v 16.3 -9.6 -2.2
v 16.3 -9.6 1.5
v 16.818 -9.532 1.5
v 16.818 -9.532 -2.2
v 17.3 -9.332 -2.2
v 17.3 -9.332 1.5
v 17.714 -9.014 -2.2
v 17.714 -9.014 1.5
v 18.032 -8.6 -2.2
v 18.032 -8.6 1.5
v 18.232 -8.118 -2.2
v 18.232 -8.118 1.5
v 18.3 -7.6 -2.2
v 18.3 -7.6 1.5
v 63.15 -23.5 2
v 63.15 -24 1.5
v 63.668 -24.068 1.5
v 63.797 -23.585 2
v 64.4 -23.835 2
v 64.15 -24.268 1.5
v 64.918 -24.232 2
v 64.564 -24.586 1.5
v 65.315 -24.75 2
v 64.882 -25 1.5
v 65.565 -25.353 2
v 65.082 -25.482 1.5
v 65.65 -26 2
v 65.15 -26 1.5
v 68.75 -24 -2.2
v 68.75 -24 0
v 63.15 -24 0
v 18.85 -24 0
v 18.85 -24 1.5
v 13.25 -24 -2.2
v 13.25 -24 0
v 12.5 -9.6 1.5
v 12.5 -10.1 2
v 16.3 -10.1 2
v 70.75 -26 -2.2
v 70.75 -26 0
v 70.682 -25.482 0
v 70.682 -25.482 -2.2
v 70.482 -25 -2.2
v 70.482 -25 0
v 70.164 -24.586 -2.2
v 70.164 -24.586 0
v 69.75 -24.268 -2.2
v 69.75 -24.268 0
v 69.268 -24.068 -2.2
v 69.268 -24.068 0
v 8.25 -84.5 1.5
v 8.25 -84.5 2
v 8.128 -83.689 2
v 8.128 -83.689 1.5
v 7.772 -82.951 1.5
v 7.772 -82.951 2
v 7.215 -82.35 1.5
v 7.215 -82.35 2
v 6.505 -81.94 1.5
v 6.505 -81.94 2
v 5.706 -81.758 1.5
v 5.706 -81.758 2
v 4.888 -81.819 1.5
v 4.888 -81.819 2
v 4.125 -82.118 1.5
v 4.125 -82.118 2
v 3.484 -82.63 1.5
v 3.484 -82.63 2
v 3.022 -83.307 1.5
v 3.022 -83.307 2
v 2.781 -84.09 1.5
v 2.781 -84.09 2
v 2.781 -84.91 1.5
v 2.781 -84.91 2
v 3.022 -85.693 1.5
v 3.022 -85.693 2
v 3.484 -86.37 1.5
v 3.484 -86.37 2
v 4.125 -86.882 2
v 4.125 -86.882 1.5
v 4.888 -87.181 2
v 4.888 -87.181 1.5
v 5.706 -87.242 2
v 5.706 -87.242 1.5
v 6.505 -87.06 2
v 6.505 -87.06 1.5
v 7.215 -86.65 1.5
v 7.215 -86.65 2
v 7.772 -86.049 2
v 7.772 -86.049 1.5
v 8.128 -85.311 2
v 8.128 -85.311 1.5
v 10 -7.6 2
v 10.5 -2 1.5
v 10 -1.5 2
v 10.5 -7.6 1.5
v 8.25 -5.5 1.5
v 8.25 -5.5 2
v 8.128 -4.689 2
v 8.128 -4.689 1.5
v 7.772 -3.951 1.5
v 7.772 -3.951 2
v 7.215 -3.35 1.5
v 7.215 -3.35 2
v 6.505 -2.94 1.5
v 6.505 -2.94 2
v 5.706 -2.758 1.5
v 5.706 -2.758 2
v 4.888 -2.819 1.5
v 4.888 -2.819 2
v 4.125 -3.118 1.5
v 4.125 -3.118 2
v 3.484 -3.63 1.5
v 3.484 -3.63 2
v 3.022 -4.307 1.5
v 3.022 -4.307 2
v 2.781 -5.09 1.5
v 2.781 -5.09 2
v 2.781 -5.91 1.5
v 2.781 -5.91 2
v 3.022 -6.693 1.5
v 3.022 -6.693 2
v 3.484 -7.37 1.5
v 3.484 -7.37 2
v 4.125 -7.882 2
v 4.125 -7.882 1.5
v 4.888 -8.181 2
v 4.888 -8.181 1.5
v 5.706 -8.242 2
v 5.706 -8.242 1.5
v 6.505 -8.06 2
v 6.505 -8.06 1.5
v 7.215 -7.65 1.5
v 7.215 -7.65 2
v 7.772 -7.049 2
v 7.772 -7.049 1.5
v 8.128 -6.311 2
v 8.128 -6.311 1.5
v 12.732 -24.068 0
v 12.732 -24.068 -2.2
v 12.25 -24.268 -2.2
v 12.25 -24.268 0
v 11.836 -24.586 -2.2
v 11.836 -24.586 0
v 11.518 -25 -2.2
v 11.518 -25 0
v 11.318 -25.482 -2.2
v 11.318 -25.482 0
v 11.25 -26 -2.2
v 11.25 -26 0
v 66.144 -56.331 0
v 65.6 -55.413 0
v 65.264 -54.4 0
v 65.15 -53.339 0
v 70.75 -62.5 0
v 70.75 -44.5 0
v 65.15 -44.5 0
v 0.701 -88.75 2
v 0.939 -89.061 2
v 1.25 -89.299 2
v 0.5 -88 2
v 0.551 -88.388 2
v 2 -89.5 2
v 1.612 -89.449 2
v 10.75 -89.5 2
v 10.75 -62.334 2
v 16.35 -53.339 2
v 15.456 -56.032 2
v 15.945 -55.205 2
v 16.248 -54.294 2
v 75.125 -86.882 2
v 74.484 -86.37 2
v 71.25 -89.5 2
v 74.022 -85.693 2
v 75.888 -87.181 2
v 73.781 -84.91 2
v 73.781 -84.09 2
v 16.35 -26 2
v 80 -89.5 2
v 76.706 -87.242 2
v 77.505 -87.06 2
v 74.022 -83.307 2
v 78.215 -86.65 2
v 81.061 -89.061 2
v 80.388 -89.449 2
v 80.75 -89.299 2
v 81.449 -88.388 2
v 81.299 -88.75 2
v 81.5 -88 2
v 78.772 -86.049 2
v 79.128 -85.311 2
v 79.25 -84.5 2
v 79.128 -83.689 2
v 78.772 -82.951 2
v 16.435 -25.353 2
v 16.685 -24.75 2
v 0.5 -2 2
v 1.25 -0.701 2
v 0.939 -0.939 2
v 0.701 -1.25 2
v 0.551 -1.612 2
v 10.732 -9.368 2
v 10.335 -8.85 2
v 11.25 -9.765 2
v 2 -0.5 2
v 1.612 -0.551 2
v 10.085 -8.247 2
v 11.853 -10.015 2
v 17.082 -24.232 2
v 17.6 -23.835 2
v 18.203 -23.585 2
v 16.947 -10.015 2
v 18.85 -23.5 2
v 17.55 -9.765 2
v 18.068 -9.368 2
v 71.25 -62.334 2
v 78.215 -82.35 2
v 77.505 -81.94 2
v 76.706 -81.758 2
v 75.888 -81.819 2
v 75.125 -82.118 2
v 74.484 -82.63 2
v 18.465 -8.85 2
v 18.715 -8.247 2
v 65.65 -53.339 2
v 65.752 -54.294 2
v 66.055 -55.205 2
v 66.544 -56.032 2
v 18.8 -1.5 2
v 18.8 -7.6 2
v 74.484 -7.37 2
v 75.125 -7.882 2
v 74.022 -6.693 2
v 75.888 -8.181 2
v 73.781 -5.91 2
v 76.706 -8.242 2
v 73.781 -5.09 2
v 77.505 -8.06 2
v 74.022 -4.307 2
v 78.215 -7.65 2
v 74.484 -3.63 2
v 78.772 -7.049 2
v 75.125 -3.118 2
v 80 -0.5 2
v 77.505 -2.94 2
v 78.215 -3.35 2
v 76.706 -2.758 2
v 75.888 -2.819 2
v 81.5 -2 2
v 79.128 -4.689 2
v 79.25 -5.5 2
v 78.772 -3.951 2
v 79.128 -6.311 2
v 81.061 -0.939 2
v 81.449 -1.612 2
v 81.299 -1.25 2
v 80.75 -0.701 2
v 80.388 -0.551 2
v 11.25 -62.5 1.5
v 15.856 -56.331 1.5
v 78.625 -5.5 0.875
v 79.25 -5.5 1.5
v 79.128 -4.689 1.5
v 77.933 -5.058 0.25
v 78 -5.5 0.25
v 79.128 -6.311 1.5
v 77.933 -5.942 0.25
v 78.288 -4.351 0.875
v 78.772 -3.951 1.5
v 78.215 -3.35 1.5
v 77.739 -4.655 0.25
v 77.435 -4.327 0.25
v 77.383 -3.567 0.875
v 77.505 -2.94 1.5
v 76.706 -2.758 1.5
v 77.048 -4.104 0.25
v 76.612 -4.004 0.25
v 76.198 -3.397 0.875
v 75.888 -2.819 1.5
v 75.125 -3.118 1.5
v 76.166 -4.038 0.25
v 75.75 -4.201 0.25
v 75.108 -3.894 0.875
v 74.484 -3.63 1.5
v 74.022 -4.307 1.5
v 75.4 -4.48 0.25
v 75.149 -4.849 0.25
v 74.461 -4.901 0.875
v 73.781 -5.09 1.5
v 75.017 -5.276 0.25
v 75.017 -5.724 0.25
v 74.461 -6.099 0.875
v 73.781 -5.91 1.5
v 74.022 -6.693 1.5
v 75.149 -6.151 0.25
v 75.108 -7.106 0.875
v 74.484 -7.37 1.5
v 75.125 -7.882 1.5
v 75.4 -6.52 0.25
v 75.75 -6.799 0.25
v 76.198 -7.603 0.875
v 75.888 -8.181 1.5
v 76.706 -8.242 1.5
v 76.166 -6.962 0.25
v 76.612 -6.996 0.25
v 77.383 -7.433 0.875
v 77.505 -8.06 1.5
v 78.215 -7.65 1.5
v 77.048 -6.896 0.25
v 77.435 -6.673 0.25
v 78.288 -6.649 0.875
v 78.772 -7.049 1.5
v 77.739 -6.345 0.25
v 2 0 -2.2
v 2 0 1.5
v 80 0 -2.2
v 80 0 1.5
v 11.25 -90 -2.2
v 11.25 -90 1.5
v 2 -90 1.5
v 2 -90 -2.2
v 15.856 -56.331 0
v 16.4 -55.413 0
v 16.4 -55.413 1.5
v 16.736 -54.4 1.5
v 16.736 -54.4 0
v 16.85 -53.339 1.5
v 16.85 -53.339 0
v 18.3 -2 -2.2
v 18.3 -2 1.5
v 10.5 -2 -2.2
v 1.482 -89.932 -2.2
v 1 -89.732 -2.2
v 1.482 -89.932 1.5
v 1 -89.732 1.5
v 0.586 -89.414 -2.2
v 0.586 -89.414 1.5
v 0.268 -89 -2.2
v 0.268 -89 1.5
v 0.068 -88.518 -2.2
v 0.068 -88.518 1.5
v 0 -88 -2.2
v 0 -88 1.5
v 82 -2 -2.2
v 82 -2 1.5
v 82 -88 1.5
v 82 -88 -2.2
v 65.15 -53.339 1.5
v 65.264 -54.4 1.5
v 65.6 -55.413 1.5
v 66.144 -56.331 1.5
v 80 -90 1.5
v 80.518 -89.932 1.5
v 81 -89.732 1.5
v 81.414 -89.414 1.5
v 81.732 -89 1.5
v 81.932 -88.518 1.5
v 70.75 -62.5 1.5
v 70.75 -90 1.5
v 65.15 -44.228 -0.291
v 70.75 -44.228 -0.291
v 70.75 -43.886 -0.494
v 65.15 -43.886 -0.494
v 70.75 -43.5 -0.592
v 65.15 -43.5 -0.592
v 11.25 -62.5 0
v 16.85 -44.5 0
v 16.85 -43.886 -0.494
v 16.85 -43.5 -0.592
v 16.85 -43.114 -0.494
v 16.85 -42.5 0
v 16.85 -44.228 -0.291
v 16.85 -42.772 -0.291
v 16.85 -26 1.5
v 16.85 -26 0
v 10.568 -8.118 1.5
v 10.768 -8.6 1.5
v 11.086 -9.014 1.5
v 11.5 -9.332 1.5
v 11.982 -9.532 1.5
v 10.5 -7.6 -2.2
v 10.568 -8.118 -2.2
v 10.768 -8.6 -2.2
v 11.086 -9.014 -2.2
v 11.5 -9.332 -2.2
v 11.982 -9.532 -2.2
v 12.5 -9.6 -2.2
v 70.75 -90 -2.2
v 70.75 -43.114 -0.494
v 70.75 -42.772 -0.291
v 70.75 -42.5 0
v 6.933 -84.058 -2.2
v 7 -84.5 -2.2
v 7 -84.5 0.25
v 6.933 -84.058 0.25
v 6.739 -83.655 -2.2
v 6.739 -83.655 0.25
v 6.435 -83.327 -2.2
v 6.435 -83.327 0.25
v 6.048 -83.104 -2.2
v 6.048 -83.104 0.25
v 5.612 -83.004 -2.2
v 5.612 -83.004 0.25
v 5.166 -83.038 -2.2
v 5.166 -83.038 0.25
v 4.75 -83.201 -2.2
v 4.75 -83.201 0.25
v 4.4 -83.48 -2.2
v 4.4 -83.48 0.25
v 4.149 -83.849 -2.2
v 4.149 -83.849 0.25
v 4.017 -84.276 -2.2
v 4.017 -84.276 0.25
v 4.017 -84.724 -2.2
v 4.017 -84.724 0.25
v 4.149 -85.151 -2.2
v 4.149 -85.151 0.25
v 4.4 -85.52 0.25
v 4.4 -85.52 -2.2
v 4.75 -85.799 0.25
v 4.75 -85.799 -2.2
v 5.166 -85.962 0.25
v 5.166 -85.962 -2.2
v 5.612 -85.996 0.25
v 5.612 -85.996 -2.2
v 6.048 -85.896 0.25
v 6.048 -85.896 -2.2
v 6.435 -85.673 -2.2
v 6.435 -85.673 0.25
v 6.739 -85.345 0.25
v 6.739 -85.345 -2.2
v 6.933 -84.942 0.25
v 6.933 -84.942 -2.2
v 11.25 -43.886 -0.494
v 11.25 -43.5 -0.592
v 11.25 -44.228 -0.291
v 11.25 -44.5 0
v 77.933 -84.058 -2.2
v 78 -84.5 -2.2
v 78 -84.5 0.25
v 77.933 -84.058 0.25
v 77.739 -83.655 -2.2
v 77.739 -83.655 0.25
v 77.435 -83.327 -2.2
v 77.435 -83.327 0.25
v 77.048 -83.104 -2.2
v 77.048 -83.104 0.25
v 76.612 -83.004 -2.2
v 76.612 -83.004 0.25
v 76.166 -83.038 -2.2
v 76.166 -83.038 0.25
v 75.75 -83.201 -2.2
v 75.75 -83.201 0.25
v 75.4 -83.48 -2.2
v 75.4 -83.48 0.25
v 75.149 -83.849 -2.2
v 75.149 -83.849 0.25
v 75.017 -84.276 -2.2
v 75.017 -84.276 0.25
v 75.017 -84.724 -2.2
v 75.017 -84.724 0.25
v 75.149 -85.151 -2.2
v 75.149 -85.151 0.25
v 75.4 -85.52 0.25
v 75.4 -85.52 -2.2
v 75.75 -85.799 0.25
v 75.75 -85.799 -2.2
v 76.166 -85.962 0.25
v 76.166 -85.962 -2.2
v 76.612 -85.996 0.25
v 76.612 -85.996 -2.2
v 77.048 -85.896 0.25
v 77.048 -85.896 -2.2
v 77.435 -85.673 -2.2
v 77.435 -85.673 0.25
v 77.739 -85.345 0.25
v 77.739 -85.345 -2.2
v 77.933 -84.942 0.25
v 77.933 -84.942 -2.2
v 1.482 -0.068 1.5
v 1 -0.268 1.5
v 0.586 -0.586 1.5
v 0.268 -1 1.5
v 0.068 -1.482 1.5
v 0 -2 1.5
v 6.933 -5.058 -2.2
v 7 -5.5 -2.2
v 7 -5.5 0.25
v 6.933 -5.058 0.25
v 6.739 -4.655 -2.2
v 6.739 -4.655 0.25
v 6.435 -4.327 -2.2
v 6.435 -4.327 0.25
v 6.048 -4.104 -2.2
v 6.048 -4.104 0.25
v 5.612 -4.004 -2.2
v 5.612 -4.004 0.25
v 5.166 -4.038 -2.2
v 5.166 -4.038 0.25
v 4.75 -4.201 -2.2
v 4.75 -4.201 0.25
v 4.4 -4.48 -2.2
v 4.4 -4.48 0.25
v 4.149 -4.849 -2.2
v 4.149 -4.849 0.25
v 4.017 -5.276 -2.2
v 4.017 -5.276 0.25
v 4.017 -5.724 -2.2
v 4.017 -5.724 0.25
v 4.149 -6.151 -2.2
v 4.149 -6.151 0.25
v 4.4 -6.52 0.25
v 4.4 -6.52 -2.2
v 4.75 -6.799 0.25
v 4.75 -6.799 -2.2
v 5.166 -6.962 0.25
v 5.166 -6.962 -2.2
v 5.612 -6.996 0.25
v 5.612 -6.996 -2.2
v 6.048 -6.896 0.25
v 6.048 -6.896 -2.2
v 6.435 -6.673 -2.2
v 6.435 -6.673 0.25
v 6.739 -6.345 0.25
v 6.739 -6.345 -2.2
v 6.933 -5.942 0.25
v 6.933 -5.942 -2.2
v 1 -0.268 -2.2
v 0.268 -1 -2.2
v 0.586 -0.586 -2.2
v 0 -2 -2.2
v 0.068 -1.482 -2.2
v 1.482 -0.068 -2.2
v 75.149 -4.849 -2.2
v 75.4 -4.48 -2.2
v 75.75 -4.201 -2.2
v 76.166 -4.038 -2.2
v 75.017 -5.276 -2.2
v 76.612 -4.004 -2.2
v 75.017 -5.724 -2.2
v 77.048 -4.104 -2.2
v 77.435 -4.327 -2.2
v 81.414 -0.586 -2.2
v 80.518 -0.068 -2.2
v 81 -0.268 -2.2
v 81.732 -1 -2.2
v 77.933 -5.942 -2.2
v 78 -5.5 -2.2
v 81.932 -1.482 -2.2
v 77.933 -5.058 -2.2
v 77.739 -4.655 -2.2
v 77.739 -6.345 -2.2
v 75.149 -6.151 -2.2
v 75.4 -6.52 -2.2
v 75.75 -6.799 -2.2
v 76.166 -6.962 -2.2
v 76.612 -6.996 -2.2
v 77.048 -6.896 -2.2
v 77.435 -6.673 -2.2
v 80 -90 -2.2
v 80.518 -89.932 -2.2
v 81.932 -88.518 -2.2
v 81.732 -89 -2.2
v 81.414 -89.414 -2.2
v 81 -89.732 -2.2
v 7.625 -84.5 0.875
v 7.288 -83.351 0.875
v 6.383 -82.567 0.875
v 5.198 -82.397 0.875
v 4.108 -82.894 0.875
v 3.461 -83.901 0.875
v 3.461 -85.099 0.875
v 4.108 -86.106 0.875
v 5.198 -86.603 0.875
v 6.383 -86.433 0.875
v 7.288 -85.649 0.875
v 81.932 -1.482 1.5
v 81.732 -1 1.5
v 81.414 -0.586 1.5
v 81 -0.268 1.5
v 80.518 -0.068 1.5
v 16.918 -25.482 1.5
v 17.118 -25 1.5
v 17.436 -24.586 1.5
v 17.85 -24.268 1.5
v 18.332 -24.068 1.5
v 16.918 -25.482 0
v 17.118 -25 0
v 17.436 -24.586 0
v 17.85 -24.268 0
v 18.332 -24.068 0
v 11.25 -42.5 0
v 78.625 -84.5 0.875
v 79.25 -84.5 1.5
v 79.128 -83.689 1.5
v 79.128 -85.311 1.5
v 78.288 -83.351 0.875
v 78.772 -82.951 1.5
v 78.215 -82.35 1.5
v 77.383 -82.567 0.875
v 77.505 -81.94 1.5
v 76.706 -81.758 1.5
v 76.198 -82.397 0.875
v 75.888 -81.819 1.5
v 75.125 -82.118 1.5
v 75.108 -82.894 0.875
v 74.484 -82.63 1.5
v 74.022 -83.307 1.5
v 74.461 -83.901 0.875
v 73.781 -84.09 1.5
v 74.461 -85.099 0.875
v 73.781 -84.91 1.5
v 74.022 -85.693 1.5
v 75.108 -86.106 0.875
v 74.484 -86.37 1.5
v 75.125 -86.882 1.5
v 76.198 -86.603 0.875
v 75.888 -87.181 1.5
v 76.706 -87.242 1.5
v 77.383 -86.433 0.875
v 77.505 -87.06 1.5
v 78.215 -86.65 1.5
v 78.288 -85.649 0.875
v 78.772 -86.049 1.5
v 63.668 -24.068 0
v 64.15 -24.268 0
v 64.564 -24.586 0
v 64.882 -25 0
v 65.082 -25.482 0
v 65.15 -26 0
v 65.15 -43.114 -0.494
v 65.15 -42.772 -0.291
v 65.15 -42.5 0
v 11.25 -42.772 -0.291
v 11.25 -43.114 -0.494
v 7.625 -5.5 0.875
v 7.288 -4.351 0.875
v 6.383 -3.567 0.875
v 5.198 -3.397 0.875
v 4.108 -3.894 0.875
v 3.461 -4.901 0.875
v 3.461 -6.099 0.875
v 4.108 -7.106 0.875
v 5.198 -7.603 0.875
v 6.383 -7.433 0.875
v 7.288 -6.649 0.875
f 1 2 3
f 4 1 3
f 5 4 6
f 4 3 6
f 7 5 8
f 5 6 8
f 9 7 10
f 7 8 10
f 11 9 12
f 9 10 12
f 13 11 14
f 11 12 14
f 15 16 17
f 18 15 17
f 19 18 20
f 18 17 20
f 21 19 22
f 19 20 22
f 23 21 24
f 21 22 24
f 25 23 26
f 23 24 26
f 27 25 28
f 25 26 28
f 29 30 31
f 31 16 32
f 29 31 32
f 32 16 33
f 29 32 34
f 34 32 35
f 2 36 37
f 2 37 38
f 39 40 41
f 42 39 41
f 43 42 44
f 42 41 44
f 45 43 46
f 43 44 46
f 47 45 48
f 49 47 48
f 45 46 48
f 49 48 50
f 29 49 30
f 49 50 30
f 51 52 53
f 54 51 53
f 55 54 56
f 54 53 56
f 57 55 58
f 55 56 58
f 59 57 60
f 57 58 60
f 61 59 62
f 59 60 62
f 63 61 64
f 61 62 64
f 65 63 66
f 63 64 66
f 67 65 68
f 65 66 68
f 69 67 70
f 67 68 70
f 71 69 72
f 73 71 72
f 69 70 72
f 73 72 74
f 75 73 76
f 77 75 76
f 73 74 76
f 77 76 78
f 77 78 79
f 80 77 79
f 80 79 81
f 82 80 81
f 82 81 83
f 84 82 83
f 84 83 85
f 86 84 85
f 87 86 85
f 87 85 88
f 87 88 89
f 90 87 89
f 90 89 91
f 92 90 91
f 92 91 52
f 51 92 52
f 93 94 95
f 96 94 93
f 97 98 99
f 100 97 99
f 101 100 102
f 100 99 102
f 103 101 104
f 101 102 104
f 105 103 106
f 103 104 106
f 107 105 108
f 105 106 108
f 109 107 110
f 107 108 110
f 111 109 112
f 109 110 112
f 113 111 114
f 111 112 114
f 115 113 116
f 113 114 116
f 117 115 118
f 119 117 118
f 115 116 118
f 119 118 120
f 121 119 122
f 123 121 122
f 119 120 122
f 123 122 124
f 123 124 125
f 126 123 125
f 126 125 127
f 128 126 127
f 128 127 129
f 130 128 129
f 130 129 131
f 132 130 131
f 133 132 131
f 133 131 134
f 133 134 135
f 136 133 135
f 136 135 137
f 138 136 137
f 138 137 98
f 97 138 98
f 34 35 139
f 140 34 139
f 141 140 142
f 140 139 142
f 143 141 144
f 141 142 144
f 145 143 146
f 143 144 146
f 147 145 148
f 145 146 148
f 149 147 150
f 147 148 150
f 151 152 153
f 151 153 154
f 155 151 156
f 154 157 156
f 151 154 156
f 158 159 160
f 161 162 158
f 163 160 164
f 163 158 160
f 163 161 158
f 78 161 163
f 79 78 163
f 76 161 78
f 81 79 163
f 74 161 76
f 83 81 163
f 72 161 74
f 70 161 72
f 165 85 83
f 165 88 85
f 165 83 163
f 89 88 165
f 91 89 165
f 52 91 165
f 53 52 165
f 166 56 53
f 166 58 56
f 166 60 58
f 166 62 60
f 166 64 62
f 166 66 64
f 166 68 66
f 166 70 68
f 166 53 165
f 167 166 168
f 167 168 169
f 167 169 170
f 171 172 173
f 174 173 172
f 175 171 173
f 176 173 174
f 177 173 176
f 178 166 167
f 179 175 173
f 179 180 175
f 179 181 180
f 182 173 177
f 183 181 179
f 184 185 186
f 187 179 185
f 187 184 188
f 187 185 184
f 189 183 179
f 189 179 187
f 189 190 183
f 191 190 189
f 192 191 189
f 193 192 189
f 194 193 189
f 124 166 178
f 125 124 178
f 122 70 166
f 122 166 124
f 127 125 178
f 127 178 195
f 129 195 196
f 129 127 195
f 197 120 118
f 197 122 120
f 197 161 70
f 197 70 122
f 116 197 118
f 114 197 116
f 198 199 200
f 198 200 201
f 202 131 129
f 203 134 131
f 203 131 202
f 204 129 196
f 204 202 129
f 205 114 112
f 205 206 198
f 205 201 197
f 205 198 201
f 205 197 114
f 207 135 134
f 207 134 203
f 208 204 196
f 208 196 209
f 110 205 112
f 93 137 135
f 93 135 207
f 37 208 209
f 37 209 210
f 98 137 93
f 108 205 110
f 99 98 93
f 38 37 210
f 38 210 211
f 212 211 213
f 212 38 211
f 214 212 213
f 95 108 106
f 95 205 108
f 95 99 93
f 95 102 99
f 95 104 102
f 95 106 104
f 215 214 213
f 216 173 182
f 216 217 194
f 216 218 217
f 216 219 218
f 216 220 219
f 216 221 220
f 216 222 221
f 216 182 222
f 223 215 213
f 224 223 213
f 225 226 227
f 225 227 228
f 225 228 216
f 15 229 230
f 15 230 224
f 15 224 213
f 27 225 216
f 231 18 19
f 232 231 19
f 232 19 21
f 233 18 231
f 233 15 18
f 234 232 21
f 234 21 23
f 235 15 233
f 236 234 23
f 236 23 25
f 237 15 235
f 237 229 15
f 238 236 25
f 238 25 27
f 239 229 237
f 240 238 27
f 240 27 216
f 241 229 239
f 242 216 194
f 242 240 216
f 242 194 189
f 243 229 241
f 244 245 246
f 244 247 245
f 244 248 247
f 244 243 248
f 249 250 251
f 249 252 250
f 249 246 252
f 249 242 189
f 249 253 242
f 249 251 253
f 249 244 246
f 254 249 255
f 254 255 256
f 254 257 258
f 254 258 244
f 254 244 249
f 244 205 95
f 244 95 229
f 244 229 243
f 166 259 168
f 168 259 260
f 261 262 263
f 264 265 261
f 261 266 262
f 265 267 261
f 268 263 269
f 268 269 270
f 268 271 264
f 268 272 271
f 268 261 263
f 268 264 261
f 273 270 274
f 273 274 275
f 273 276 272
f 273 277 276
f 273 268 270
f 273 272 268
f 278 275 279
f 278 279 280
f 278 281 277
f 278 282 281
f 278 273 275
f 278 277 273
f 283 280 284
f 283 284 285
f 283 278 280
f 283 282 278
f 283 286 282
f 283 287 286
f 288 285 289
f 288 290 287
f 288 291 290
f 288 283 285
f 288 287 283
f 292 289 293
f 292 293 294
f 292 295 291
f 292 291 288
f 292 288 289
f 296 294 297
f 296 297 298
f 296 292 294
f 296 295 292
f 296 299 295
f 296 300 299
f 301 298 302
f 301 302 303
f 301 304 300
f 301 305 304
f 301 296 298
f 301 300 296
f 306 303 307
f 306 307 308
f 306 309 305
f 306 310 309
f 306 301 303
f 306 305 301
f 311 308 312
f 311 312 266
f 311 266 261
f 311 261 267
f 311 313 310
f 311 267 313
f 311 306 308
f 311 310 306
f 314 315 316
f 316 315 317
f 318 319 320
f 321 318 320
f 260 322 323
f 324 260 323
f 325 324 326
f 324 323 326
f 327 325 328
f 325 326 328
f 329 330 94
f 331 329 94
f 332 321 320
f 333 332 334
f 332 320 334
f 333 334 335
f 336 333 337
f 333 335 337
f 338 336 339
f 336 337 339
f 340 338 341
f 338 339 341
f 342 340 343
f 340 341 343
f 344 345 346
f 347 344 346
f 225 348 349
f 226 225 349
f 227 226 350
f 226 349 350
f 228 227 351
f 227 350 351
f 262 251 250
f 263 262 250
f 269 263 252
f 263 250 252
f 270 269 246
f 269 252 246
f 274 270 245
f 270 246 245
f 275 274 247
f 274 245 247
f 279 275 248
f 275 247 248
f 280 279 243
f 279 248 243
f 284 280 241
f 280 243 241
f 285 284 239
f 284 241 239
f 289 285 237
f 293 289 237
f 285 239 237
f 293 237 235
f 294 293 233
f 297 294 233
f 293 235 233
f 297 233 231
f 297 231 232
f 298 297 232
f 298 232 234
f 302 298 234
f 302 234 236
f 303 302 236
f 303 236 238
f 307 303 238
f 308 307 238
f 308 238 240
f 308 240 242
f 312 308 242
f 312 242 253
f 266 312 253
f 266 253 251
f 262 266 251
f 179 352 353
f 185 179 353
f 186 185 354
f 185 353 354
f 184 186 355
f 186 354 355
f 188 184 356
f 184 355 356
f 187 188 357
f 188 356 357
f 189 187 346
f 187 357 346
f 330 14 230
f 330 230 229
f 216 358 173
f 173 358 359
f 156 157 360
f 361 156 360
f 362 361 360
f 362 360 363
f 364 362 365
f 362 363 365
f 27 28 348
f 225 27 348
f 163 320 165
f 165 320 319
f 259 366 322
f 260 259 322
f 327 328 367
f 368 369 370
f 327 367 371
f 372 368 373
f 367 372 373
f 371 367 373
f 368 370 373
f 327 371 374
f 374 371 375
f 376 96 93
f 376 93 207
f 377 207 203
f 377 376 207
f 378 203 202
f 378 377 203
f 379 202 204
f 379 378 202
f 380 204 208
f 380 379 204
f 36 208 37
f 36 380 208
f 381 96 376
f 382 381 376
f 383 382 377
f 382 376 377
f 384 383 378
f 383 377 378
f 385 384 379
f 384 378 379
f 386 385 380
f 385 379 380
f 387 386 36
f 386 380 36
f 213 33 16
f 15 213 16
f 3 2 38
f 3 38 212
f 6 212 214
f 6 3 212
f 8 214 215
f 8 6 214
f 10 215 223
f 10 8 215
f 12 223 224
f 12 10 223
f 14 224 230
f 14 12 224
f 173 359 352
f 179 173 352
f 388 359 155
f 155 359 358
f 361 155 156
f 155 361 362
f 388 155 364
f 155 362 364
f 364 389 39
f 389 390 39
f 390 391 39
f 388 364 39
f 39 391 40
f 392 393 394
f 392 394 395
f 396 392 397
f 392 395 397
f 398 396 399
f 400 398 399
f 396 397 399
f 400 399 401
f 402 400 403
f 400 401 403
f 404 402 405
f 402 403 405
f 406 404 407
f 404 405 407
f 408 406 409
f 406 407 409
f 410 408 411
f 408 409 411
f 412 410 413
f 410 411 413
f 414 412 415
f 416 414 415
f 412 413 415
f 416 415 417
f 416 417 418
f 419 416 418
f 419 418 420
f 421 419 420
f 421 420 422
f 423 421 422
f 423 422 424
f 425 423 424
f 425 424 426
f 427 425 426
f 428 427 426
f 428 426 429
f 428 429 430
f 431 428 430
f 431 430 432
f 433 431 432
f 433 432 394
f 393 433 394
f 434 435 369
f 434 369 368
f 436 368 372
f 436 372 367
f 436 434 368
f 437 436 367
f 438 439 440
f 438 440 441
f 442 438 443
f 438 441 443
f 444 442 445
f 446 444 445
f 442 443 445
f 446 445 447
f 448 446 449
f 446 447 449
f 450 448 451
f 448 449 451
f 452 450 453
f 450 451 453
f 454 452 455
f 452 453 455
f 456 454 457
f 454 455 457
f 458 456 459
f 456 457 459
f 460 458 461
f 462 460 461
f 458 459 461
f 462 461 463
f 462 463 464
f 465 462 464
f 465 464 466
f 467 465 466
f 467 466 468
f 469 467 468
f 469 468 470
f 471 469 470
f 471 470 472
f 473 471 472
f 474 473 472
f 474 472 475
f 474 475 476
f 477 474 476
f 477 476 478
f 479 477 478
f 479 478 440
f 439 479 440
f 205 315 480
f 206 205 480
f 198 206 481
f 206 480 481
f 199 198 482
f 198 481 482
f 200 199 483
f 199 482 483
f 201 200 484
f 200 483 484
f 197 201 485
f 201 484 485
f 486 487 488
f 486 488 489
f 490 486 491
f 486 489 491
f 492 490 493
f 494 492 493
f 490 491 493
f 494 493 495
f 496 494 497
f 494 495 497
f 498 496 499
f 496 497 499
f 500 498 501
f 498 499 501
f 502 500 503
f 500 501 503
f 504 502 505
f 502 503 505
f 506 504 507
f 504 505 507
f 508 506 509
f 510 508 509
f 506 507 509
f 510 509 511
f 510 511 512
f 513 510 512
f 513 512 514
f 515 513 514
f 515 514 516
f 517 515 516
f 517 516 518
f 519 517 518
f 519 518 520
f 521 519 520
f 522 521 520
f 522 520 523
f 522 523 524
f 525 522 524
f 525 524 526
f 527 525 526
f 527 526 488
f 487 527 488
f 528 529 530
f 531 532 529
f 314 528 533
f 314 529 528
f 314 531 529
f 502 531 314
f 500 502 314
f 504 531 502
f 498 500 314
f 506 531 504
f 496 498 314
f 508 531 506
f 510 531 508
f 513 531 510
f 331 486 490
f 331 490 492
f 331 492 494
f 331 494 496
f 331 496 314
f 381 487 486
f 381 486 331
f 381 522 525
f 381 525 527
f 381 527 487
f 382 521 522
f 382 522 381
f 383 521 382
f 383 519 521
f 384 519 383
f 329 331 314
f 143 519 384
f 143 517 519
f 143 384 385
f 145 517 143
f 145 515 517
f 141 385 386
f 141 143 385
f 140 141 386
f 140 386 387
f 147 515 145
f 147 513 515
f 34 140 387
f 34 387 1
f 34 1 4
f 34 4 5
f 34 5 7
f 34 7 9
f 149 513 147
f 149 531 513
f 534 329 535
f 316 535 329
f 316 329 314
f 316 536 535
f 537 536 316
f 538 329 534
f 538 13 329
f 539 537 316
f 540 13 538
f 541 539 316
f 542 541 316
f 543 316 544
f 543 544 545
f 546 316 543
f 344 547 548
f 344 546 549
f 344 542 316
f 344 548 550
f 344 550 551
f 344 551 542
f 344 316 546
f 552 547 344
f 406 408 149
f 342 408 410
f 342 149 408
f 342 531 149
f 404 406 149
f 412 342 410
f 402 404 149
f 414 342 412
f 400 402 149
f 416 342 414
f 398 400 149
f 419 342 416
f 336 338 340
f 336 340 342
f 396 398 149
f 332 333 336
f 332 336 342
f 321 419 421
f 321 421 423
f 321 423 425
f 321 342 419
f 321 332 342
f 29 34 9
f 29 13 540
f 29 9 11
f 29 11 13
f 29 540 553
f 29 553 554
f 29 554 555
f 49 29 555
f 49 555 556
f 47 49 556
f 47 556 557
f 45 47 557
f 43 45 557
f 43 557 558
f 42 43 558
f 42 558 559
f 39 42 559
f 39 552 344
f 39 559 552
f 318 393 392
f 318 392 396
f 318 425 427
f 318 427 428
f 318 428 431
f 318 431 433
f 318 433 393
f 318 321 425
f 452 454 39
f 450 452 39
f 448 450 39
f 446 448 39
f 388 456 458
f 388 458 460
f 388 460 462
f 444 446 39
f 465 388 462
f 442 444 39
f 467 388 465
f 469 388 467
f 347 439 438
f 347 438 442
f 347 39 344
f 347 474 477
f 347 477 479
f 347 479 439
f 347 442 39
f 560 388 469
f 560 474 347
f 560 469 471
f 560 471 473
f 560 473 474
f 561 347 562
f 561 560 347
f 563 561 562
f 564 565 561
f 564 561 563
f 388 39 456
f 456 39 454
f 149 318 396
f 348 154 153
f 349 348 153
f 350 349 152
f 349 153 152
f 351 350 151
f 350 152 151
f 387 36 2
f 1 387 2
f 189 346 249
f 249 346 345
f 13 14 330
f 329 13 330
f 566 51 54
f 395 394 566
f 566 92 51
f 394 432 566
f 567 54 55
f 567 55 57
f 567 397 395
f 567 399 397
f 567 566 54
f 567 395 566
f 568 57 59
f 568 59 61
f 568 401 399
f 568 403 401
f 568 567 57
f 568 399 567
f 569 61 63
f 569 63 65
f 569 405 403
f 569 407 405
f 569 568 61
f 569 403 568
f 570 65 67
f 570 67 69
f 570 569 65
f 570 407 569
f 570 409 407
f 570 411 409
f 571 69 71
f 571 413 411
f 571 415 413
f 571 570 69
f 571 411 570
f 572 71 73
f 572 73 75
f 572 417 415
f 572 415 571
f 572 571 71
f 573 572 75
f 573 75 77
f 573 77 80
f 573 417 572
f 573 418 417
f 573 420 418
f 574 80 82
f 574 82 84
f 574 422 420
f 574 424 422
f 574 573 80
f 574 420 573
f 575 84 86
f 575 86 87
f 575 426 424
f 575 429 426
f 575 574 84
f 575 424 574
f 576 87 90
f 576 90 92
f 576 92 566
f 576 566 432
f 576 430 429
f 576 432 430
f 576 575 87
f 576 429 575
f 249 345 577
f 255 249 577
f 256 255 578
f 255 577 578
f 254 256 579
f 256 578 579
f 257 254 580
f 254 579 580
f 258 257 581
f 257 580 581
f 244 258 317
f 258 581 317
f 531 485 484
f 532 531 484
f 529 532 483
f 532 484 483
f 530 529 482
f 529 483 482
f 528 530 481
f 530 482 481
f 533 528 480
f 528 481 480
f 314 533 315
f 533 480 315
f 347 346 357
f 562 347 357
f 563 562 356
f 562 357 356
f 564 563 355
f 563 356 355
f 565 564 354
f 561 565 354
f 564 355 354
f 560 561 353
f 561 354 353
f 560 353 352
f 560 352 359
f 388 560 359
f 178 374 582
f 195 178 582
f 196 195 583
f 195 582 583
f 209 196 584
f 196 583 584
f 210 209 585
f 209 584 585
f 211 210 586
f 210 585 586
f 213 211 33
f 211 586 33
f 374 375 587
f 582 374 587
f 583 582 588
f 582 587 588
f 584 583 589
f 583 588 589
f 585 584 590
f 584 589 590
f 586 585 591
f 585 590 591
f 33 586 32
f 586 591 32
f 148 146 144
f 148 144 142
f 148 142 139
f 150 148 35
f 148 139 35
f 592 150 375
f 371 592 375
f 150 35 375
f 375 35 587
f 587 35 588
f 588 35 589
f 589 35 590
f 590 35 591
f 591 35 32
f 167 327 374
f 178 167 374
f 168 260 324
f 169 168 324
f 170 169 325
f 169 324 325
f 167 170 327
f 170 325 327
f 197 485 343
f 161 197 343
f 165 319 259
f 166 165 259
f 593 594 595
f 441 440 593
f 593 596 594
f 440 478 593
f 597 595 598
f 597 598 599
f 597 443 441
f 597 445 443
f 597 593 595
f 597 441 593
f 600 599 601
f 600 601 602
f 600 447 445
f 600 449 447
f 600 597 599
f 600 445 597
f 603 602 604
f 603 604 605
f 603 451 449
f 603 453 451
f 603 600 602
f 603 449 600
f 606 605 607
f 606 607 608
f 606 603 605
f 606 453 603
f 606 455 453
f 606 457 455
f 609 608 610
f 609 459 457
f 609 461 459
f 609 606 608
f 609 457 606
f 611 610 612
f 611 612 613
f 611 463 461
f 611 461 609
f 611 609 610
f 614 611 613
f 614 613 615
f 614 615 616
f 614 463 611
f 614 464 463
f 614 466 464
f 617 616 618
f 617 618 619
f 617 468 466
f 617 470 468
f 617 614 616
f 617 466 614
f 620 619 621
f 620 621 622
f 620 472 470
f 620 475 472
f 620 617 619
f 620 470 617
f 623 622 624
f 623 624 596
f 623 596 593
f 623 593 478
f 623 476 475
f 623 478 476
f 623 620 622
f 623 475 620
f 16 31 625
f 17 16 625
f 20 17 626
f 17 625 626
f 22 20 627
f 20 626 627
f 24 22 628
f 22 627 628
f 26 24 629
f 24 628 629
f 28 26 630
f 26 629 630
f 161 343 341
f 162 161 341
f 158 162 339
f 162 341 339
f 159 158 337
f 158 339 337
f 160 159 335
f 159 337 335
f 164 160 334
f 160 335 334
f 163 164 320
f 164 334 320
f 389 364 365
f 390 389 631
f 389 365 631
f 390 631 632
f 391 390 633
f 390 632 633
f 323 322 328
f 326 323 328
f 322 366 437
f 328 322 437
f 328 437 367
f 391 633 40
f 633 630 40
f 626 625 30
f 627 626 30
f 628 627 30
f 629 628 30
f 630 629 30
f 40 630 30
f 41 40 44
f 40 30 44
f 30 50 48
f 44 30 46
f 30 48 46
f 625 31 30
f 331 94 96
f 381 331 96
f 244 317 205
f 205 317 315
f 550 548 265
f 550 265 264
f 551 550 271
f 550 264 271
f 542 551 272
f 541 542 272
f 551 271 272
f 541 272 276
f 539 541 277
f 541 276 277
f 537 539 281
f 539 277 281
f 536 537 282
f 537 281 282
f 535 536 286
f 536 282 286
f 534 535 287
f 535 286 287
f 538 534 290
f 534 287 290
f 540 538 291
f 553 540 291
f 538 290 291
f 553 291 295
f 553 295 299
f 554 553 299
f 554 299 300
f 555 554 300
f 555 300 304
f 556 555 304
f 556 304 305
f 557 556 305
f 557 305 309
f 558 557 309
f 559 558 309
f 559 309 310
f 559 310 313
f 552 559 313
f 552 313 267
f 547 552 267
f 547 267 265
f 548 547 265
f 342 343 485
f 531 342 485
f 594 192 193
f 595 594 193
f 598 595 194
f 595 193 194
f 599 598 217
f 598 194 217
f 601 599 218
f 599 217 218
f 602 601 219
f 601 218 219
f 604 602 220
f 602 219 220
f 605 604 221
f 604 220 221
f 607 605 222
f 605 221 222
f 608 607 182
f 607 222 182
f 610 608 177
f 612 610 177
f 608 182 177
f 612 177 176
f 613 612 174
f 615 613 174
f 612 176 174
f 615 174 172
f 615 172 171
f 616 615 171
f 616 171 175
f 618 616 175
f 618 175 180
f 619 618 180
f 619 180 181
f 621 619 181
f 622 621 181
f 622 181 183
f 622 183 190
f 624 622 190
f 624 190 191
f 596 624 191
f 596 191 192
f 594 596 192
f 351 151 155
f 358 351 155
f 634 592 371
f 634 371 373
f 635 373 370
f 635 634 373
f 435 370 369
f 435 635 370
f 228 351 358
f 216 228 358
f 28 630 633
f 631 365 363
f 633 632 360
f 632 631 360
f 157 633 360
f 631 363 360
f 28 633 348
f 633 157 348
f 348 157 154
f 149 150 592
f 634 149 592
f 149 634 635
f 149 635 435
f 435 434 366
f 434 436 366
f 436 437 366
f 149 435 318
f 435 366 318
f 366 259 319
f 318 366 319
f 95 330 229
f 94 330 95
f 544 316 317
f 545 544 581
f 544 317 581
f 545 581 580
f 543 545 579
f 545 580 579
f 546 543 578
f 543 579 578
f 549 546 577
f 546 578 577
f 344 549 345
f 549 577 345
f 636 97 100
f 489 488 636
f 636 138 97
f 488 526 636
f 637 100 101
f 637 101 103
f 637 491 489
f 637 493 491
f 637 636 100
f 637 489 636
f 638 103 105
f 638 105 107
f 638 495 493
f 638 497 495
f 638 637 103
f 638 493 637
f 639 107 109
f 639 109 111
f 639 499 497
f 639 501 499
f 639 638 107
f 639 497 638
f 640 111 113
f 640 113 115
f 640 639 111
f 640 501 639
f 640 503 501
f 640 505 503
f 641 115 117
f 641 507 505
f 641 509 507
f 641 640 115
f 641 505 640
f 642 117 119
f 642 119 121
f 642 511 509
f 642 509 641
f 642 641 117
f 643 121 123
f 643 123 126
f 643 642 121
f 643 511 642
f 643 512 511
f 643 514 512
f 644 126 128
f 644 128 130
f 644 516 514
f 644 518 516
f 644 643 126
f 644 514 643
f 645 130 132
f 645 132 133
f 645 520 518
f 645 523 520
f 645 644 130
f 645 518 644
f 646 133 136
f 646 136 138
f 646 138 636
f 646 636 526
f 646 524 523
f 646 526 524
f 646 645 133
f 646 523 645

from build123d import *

# Parameters (mm, degrees)
F1_DEPTH      = 2
F3_DEPTH      = 2.2
F5_DEPTH      = 25
F6_R          = 1.5
F7_DEPTH      = 4.2
F8_R          = 2.75
F9_DEPTH      = 2
F10_S5_R      = 1.5
F10_T6_DEPTH  = 5
F10_S11_R     = 1.5
F10_T12_DEPTH = 5
F10_S17_R     = 1.5
F10_T18_DEPTH = 5
F10_S23_R     = 1.5
F10_T24_DEPTH = 5
F11_W         = 5.6
F11_H         = 2
F12_DEPTH     = 0.6
F13_T1_DEPTH  = 8.4722813233
F13_T3_DEPTH  = 8.4722813233
F14_SIZE      = 0.5


# Not quite as in the source:
# - a fillet or chamfer that OpenCascade refuses, or shapes differently, is made with other operations: its cross-section is extruded or revolved along the edge and cut away or added


with BuildPart() as f1:
    # F0 (on Top) → F1 (new body)
    with BuildSketch(Plane.XY):
        with BuildLine():
            Line((80, 0), (2, 0))
            ThreePointArc((2, 0), (0.5857864376, -0.5857864376), (0, -2))
            Line((0, -2), (0, -88))
            ThreePointArc((0, -88), (0.5857864376, -89.4142135624), (2, -90))
            Line((2, -90), (11.25, -90))
            Line((11.25, -90), (11.25, -62.5))
            Line((11.25, -62.5), (15.8564011104, -56.3307127986))
            ThreePointArc((15.8564011104, -56.3307127986), (16.5951030311, -54.9153368199), (16.85, -53.3392666362))
            Line((16.85, -53.3392666362), (16.85, -26))
            ThreePointArc((16.85, -26), (17.4357864376, -24.5857864376), (18.85, -24))
            Line((18.85, -24), (63.15, -24))
            ThreePointArc((63.15, -24), (64.5642135624, -24.5857864376), (65.15, -26))
            Line((65.15, -26), (65.15, -53.3392666362))
            ThreePointArc((65.15, -53.3392666362), (65.4048969689, -54.9153368199), (66.1435988896, -56.3307127986))
            Line((66.1435988896, -56.3307127986), (70.75, -62.5))
            Line((70.75, -62.5), (70.75, -90))
            Line((70.75, -90), (80, -90))
            ThreePointArc((80, -90), (81.4142135624, -89.4142135624), (82, -88))
            Line((82, -88), (82, -2))
            ThreePointArc((82, -2), (81.4142135624, -0.5857864376), (80, 0))
        make_face()
    extrude(amount=F1_DEPTH)

    # F2 (on face) → F3 (join)
    with BuildSketch(Plane(origin=(0, 0, 0), x_dir=(1, 0, 0), z_dir=(0, 0, -1))):
        with BuildLine():
            ThreePointArc((80, 0), (81.4142135624, 0.5857864376), (82, 2))
            Line((82, 2), (82, 88))
            ThreePointArc((82, 88), (81.4142135624, 89.4142135624), (80, 90))
            Line((80, 90), (70.75, 90))
            Line((70.75, 90), (70.75, 62.5))
            Line((70.75, 62.5), (70.75, 26))
            ThreePointArc((70.75, 26), (70.1642135624, 24.5857864376), (68.75, 24))
            Line((68.75, 24), (65.15, 24))
            Line((65.15, 24), (16.85, 24))
            Line((16.85, 24), (13.25, 24))
            ThreePointArc((13.25, 24), (11.8357864376, 24.5857864376), (11.25, 26))
            Line((11.25, 26), (11.25, 62.5))
            Line((11.25, 62.5), (11.25, 90))
            Line((11.25, 90), (2, 90))
            ThreePointArc((2, 90), (0.5857864376, 89.4142135624), (0, 88))
            Line((0, 88), (0, 2))
            ThreePointArc((0, 2), (0.5857864376, 0.5857864376), (2, 0))
            Line((2, 0), (80, 0))
        make_face()
    extrude(amount=F3_DEPTH)

    # F4 (on face) → F5 (cut)
    with BuildSketch(Plane.XY.offset(2)):
        with BuildLine():
            Line((18.3, -2), (10.5, -2))
            Line((10.5, -2), (10.5, -7.6))
            ThreePointArc((10.5, -7.6), (11.0857864376, -9.0142135624), (12.5, -9.6))
            Line((12.5, -9.6), (16.3, -9.6))
            ThreePointArc((16.3, -9.6), (17.7142135624, -9.0142135624), (18.3, -7.6))
            Line((18.3, -7.6), (18.3, -2))
        make_face()
    extrude(amount=-F5_DEPTH, mode=Mode.SUBTRACT)

    # F6 (on face) → F7 (cut)
    with BuildSketch(Plane.XY.offset(2)):
        with Locations((5.5, -84.5)):
            Circle(F6_R)
        with Locations((76.5, -84.5)):
            Circle(F6_R)
        with Locations((5.5, -5.5)):
            Circle(F6_R)
        with Locations((76.5, -5.5)):
            Circle(F6_R)
    extrude(amount=-F7_DEPTH, mode=Mode.SUBTRACT)

    # F8 (on face) → F9 (cut)
    with BuildSketch(Plane.XY.offset(2)):
        with Locations((5.5, -5.5)):
            Circle(F8_R)
        with Locations((76.5, -5.5)):
            Circle(F8_R)
        with Locations((76.5, -84.5)):
            Circle(F8_R)
        with Locations((5.5, -84.5)):
            Circle(F8_R)
    extrude(amount=-F9_DEPTH, mode=Mode.SUBTRACT)

    # F10: chamfer of 1.5 on 4 edges, made by hand


with BuildPart() as f10_tool2:
    # F10_s3 → F10_t4 (revolve)
    with BuildSketch(Plane.XZ.offset(84.5)):
        Polygon((8.25, 1.5), (6.75, 0), (8.25, 0), align=None)
    revolve(axis=Axis((5.5, -84.5, 0), (0, 0, 1)))

    # F10_s5 → F10_t6 (cut, symmetric)
    with BuildSketch(Plane.XY.offset(0.7)):
        with Locations((5.5, -84.5)):
            Circle(F10_S5_R)
    extrude(amount=F10_T6_DEPTH, both=True, mode=Mode.SUBTRACT)


with BuildPart() as f1_1:
    add(f1.part)

    # F10_t1: union F10_tool2
    add(f10_tool2.part)


with BuildPart() as f10_tool8:
    # F10_s9 → F10_t10 (revolve)
    with BuildSketch(Plane.XZ.offset(84.5)):
        Polygon((79.25, 1.5), (77.75, 0), (79.25, 0), align=None)
    revolve(axis=Axis((76.5, -84.5, 0), (0, 0, 1)))

    # F10_s11 → F10_t12 (cut, symmetric)
    with BuildSketch(Plane.XY.offset(0.7)):
        with Locations((76.5, -84.5)):
            Circle(F10_S11_R)
    extrude(amount=F10_T12_DEPTH, both=True, mode=Mode.SUBTRACT)


with BuildPart() as f1_2:
    add(f1_1.part)

    # F10_t7: union F10_tool8
    add(f10_tool8.part)


with BuildPart() as f10_tool14:
    # F10_s15 → F10_t16 (revolve)
    with BuildSketch(Plane.XZ.offset(5.5)):
        Polygon((8.25, 1.5), (6.75, 0), (8.25, 0), align=None)
    revolve(axis=Axis((5.5, -5.5, 0), (0, 0, 1)))

    # F10_s17 → F10_t18 (cut, symmetric)
    with BuildSketch(Plane.XY.offset(0.7)):
        with Locations((5.5, -5.5)):
            Circle(F10_S17_R)
    extrude(amount=F10_T18_DEPTH, both=True, mode=Mode.SUBTRACT)


with BuildPart() as f1_3:
    add(f1_2.part)

    # F10_t13: union F10_tool14
    add(f10_tool14.part)


with BuildPart() as f10_tool20:
    # F10_s21 → F10_t22 (revolve)
    with BuildSketch(Plane.XZ.offset(5.5)):
        Polygon((79.25, 1.5), (77.75, 0), (79.25, 0), align=None)
    revolve(axis=Axis((76.5, -5.5, 0), (0, 0, 1)))

    # F10_s23 → F10_t24 (cut, symmetric)
    with BuildSketch(Plane.XY.offset(0.7)):
        with Locations((76.5, -5.5)):
            Circle(F10_S23_R)
    extrude(amount=F10_T24_DEPTH, both=True, mode=Mode.SUBTRACT)


with BuildPart() as f1_4:
    add(f1_3.part)

    # F10_t19: union F10_tool20
    add(f10_tool20.part)

    # F11 (on face) → F12 (join)
    with BuildSketch(Plane(origin=(0, 0, 0), x_dir=(1, 0, 0), z_dir=(0, 0, -1))):
        with Locations((14.05, 43.5)):
            Rectangle(F11_W, F11_H)
        with Locations((67.95, 43.5)):
            Rectangle(F11_W, F11_H)
    extrude(amount=F12_DEPTH)

    # F13: fillet of radius 1.4 on 4 edges, made by hand

    # F13_s2 → F13_t1 (cut)
    with BuildSketch(Plane.YZ.offset(11.25)):
        with BuildLine():
            ThreePointArc((-42.5, 0), (-43.0008384595, -0.4409673646), (-43.6489125293, -0.6))
            Line((-43.6489125293, -0.6), (-42.5, -0.6))
            Line((-42.5, -0.6), (-42.5, 0))
        make_face()
        with BuildLine():
            ThreePointArc((-43.3510874707, -0.6), (-43.9991615405, -0.4409673646), (-44.5, 0))
            Line((-44.5, 0), (-44.5, -0.6))
            Line((-44.5, -0.6), (-43.3510874707, -0.6))
        make_face()
    extrude(amount=F13_T1_DEPTH, mode=Mode.SUBTRACT)

    # F13_s4 → F13_t3 (cut)
    with BuildSketch(Plane.YZ.offset(62.2777186767)):
        with BuildLine():
            ThreePointArc((-43.6489125293, -0.6), (-43.0008384595, -0.4409673646), (-42.5, 0))
            Line((-42.5, 0), (-42.5, -0.6))
            Line((-42.5, -0.6), (-43.6489125293, -0.6))
        make_face()
        with BuildLine():
            ThreePointArc((-44.5, 0), (-43.9991615405, -0.4409673646), (-43.3510874707, -0.6))
            Line((-43.3510874707, -0.6), (-44.5, -0.6))
            Line((-44.5, -0.6), (-44.5, 0))
        make_face()
    extrude(amount=F13_T3_DEPTH, mode=Mode.SUBTRACT)

    # F14
    f14_edges = [f1_4.edges().sort_by_distance(p)[0] for p in [
        (0.585786, -0.585786, 2),
        (41, 0, 2),
        (0, -45, 2),
        (10.5, -4.8, 2),
        (14.4, -2, 2),
        (18.3, -4.8, 2),
        (17.714214, -9.014214, 2),
        (14.4, -9.6, 2),
        (11.085786, -9.014214, 2),
        (81.414214, -0.585786, 2),
        (82, -45, 2),
        (11.25, -76.25, 2),
        (6.625, -90, 2),
        (0.585786, -89.414214, 2),
        (81.414214, -89.414214, 2),
        (75.375, -90, 2),
        (70.75, -76.25, 2),
        (68.446799, -59.415356, 2),
        (65.404897, -54.915337, 2),
        (65.15, -39.669633, 2),
        (64.564214, -24.585786, 2),
        (41, -24, 2),
        (17.435786, -24.585786, 2),
        (16.85, -39.669633, 2),
        (16.595103, -54.915337, 2),
        (13.553201, -59.415356, 2),
    ]]
    chamfer(f14_edges, length=F14_SIZE)


solid = f1_4.part
